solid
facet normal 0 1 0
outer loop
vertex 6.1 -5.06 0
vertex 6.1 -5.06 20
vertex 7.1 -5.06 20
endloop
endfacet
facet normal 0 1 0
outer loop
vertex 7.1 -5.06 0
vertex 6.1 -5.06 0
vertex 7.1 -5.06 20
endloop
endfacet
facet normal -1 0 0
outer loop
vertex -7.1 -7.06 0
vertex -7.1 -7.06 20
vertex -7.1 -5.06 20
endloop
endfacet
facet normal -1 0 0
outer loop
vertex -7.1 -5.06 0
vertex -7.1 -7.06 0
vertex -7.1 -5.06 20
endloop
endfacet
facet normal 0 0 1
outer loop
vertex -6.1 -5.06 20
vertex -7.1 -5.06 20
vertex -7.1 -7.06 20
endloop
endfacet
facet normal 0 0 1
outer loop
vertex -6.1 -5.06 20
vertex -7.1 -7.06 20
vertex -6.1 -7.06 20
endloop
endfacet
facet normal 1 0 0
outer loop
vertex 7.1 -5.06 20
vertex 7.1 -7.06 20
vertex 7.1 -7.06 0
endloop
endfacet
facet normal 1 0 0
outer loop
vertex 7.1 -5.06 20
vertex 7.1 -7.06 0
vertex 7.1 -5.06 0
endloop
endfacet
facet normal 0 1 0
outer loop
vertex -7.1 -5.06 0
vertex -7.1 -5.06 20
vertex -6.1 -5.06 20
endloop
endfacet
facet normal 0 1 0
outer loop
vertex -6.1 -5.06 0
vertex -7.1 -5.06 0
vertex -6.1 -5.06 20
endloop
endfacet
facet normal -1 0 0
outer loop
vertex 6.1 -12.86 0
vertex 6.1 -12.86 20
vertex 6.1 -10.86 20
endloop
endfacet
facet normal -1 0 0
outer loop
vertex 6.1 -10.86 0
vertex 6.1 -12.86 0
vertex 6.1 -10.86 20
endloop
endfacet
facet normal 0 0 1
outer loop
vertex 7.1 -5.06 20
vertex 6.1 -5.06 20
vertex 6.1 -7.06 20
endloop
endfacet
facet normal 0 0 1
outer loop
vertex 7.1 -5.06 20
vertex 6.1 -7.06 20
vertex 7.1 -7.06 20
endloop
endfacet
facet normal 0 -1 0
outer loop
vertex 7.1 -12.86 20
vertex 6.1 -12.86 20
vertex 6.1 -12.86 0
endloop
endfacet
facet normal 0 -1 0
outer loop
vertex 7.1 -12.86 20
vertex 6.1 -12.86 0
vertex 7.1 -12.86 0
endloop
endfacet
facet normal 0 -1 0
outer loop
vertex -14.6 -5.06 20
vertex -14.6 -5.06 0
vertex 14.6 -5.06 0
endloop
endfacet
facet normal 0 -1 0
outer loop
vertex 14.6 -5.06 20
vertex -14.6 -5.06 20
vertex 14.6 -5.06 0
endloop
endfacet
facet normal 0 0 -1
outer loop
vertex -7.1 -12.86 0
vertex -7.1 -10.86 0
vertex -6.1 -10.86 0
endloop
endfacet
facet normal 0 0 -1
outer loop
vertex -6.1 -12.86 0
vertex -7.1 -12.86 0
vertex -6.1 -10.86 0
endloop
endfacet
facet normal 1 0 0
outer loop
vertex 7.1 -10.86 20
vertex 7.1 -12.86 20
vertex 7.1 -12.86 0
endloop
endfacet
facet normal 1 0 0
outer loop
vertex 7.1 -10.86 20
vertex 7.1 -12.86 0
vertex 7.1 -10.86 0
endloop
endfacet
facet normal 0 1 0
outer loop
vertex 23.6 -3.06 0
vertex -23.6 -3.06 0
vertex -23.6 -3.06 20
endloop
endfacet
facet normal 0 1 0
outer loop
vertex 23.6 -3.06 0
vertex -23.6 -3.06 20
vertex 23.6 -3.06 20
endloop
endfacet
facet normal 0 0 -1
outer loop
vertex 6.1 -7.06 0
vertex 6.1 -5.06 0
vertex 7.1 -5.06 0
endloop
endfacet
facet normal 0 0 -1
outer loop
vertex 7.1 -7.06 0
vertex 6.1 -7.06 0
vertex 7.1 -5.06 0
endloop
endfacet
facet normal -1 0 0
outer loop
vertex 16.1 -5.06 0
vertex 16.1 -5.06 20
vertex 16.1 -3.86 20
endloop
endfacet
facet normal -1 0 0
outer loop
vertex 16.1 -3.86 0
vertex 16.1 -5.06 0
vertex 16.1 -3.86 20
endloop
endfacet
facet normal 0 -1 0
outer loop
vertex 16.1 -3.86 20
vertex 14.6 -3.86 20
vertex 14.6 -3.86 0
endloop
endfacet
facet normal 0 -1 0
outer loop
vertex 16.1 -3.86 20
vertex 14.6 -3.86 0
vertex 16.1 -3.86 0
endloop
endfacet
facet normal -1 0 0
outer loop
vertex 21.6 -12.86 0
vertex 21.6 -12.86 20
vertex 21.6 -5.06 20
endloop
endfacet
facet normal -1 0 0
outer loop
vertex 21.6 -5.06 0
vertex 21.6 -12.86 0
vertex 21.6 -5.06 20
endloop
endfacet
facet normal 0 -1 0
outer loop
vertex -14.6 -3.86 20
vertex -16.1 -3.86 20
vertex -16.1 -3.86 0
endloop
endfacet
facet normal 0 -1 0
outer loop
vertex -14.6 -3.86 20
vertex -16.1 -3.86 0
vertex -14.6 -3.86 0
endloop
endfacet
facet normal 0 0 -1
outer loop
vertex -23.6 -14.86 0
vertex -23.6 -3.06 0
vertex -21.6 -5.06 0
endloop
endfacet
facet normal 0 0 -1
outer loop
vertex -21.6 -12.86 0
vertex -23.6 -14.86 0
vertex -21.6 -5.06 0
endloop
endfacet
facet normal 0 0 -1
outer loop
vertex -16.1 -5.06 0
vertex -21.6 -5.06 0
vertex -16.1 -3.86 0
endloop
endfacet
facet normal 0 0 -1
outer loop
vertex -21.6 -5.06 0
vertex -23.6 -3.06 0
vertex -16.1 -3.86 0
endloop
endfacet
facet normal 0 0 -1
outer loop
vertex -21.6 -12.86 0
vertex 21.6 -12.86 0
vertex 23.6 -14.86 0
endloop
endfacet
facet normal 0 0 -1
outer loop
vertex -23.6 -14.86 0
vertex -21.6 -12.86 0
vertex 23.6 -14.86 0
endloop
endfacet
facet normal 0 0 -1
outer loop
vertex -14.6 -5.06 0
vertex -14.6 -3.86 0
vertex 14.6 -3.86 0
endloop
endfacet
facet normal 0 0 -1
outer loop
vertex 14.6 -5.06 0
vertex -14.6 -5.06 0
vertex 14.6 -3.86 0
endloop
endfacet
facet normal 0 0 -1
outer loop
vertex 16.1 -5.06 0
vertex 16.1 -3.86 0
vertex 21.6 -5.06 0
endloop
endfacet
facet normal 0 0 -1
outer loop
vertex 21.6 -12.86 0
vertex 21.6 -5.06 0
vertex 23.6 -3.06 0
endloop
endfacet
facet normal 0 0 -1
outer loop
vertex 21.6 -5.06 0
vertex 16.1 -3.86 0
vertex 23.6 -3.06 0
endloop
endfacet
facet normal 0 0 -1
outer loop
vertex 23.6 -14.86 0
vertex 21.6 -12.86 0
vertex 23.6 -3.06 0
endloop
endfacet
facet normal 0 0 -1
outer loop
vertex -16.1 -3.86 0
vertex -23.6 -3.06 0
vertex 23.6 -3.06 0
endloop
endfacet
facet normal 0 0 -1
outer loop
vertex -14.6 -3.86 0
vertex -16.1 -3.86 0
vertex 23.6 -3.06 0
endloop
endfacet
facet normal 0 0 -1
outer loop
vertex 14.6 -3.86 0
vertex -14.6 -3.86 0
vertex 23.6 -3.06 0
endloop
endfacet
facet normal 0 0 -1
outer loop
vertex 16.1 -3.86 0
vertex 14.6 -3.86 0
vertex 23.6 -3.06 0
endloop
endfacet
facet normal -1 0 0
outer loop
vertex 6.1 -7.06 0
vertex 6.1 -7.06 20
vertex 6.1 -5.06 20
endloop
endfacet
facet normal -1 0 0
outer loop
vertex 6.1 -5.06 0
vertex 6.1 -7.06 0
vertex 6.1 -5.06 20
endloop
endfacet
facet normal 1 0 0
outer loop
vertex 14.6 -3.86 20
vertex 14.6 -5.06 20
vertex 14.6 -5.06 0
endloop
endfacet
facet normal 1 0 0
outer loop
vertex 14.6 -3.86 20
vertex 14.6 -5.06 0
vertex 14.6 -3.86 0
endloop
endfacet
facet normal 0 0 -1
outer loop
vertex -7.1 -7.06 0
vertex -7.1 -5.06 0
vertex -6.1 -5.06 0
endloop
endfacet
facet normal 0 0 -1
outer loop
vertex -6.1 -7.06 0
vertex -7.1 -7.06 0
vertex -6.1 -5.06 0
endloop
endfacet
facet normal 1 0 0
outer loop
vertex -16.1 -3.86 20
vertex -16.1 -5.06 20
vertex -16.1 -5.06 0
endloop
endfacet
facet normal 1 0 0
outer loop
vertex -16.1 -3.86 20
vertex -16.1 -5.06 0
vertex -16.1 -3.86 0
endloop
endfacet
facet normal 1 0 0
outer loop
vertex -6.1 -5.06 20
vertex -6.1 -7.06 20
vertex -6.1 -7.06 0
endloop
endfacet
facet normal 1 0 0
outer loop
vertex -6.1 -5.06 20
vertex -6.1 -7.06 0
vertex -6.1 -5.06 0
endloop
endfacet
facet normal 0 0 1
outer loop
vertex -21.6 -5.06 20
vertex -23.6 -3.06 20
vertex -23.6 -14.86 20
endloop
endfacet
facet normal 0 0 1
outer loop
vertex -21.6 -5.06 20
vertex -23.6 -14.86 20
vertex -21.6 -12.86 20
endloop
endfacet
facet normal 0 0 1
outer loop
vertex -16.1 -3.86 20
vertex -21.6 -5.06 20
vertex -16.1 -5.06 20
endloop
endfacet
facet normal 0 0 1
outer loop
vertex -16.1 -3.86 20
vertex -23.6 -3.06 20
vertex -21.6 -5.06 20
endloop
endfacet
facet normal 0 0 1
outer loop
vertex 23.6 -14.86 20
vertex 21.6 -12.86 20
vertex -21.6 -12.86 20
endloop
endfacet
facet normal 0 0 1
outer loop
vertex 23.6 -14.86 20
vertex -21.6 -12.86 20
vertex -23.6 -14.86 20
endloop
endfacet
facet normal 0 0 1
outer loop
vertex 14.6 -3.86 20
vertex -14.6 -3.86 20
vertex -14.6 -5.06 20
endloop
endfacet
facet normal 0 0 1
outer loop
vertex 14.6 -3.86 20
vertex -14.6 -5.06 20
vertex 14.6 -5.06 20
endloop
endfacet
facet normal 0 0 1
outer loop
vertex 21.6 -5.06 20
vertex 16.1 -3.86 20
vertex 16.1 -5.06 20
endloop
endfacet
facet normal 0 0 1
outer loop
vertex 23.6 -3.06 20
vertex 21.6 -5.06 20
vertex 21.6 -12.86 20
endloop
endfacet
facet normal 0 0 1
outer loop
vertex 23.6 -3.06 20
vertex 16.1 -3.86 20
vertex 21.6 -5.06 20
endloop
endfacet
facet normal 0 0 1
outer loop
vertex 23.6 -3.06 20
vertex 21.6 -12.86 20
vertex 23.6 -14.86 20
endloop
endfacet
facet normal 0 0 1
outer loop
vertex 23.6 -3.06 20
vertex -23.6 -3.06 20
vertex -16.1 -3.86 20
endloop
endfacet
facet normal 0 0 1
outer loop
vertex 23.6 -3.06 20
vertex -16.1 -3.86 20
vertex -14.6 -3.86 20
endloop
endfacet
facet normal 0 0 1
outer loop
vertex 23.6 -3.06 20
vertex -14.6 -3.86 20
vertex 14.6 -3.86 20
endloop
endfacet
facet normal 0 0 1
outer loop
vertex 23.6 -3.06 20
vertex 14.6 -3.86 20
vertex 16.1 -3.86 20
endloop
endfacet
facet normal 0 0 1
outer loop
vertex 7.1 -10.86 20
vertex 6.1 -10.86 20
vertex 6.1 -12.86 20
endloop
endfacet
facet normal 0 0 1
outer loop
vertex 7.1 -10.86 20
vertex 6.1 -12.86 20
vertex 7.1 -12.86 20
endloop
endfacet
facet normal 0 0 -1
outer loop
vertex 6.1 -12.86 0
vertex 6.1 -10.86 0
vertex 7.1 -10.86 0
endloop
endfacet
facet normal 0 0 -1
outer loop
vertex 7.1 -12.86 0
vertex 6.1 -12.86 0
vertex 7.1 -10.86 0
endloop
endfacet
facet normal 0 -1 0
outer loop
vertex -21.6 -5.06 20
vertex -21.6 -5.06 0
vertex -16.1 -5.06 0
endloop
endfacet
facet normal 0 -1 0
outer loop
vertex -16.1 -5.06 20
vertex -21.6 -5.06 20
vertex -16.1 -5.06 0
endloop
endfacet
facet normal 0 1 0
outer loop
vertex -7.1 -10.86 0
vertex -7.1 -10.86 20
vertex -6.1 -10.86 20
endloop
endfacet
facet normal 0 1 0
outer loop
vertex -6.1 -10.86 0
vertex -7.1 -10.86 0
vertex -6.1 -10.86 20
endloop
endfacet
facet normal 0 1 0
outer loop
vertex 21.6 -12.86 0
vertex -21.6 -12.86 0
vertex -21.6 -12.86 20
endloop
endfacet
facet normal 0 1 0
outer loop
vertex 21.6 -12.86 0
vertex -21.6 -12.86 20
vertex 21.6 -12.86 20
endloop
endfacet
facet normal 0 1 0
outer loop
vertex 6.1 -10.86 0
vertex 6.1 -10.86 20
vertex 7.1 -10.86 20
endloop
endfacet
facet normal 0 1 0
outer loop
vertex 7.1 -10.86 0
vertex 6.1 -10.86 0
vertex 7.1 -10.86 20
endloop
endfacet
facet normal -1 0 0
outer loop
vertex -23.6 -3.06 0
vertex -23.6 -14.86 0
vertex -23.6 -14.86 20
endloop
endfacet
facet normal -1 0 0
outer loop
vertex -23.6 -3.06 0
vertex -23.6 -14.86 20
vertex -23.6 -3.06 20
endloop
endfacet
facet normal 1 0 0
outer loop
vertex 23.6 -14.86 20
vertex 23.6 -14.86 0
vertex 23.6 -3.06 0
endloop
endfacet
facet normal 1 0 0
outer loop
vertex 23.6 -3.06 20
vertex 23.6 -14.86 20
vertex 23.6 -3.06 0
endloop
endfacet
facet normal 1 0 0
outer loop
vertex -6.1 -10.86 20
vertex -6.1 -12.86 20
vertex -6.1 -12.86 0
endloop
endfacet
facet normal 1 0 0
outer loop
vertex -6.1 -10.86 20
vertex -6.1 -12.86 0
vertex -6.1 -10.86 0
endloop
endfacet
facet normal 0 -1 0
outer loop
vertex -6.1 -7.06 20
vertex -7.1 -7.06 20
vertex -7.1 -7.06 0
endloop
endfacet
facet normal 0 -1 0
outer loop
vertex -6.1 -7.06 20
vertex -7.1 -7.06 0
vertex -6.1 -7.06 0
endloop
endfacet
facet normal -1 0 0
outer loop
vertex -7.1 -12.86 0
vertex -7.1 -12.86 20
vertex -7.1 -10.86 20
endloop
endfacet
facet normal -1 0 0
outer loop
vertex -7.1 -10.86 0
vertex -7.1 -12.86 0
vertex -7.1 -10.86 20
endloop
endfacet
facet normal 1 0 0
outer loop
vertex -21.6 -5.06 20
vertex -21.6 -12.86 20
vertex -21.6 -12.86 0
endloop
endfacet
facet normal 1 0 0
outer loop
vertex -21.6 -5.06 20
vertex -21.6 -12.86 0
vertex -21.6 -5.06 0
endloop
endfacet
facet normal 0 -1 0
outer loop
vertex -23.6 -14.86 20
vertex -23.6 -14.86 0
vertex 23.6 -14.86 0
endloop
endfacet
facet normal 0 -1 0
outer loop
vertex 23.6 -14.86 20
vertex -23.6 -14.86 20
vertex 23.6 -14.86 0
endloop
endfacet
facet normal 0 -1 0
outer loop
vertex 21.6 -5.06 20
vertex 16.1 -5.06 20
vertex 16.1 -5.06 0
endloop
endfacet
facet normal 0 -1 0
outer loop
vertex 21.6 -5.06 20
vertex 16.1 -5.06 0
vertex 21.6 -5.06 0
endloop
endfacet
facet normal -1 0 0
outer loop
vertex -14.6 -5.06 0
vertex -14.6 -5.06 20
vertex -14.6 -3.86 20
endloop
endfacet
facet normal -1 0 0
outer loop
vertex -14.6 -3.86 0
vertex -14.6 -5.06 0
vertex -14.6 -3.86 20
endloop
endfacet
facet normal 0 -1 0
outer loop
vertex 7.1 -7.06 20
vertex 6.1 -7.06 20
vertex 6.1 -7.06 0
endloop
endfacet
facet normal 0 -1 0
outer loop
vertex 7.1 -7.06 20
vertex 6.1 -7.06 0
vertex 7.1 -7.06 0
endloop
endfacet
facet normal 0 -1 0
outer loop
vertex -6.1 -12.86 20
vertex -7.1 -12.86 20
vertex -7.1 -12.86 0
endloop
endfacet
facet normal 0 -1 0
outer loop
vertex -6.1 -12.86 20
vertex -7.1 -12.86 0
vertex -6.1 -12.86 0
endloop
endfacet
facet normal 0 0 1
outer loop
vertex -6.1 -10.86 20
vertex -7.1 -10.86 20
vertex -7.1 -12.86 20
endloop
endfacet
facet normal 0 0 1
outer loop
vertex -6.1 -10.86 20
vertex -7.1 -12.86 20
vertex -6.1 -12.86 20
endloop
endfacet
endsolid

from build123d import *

# Parameters (mm, degrees)
CROQUIS1_W                = 47.2
CROQUIS1_H                = 11.8
CROQUIS1_W_2              = 43.2
CROQUIS1_H_2              = 7.8
SALIENTE_EXTRUIR1_DEPTH   = 20
CROQUIS2_W                = 1.5
CROQUIS2_H                = 1.2
CORTAR_EXTRUIR1_DEPTH     = 20
CROQUIS3_W                = 1
CROQUIS3_H                = 2
SALIENTE_EXTRUIR2_DEPTH   = 20
SALIENTE_EXTRUIR2_2_DEPTH = 20
SALIENTE_EXTRUIR2_3_DEPTH = 20
SALIENTE_EXTRUIR2_4_DEPTH = 20


with BuildPart() as part:
    # Croquis1 → Saliente-Extruir1 (new body)
    with BuildSketch(Plane.XY):
        with Locations((0, -8.96031539)):
            Rectangle(CROQUIS1_W, CROQUIS1_H)
        with Locations((0, -8.96031539)):
            Rectangle(CROQUIS1_W_2, CROQUIS1_H_2, mode=Mode.SUBTRACT)
    extrude(amount=SALIENTE_EXTRUIR1_DEPTH)

    # Croquis2 → Cortar-Extruir1 (cut)
    with BuildSketch(Plane.XY.offset(20)):
        with Locations((-15.35, -4.46031539)):
            Rectangle(CROQUIS2_W, CROQUIS2_H)
        with Locations((15.35, -4.46031539)):
            Rectangle(CROQUIS2_W, CROQUIS2_H)
    extrude(amount=-CORTAR_EXTRUIR1_DEPTH, mode=Mode.SUBTRACT)


with BuildPart() as body_2:
    # Croquis3 → Saliente-Extruir2 (new body)
    with BuildSketch(Plane.XY.offset(20)):
        with Locations((-6.6, -6.06031539)):
            Rectangle(CROQUIS3_W, CROQUIS3_H)
    extrude(amount=-SALIENTE_EXTRUIR2_DEPTH)


with BuildPart() as body_3:
    # Croquis3 → Saliente-Extruir2 2 (new body)
    with BuildSketch(Plane.XY.offset(20)):
        with Locations((6.6, -6.06031539)):
            Rectangle(CROQUIS3_W, CROQUIS3_H)
    extrude(amount=-SALIENTE_EXTRUIR2_2_DEPTH)


with BuildPart() as body_4:
    # Croquis3 → Saliente-Extruir2 3 (new body)
    with BuildSketch(Plane.XY.offset(20)):
        with Locations((-6.6, -11.86031539)):
            Rectangle(CROQUIS3_W, CROQUIS3_H)
    extrude(amount=-SALIENTE_EXTRUIR2_3_DEPTH)


with BuildPart() as body_5:
    # Croquis3 → Saliente-Extruir2 4 (new body)
    with BuildSketch(Plane.XY.offset(20)):
        with Locations((6.6, -11.86031539)):
            Rectangle(CROQUIS3_W, CROQUIS3_H)
    extrude(amount=-SALIENTE_EXTRUIR2_4_DEPTH)


solid = Compound([part.part, body_2.part, body_3.part, body_4.part, body_5.part])
